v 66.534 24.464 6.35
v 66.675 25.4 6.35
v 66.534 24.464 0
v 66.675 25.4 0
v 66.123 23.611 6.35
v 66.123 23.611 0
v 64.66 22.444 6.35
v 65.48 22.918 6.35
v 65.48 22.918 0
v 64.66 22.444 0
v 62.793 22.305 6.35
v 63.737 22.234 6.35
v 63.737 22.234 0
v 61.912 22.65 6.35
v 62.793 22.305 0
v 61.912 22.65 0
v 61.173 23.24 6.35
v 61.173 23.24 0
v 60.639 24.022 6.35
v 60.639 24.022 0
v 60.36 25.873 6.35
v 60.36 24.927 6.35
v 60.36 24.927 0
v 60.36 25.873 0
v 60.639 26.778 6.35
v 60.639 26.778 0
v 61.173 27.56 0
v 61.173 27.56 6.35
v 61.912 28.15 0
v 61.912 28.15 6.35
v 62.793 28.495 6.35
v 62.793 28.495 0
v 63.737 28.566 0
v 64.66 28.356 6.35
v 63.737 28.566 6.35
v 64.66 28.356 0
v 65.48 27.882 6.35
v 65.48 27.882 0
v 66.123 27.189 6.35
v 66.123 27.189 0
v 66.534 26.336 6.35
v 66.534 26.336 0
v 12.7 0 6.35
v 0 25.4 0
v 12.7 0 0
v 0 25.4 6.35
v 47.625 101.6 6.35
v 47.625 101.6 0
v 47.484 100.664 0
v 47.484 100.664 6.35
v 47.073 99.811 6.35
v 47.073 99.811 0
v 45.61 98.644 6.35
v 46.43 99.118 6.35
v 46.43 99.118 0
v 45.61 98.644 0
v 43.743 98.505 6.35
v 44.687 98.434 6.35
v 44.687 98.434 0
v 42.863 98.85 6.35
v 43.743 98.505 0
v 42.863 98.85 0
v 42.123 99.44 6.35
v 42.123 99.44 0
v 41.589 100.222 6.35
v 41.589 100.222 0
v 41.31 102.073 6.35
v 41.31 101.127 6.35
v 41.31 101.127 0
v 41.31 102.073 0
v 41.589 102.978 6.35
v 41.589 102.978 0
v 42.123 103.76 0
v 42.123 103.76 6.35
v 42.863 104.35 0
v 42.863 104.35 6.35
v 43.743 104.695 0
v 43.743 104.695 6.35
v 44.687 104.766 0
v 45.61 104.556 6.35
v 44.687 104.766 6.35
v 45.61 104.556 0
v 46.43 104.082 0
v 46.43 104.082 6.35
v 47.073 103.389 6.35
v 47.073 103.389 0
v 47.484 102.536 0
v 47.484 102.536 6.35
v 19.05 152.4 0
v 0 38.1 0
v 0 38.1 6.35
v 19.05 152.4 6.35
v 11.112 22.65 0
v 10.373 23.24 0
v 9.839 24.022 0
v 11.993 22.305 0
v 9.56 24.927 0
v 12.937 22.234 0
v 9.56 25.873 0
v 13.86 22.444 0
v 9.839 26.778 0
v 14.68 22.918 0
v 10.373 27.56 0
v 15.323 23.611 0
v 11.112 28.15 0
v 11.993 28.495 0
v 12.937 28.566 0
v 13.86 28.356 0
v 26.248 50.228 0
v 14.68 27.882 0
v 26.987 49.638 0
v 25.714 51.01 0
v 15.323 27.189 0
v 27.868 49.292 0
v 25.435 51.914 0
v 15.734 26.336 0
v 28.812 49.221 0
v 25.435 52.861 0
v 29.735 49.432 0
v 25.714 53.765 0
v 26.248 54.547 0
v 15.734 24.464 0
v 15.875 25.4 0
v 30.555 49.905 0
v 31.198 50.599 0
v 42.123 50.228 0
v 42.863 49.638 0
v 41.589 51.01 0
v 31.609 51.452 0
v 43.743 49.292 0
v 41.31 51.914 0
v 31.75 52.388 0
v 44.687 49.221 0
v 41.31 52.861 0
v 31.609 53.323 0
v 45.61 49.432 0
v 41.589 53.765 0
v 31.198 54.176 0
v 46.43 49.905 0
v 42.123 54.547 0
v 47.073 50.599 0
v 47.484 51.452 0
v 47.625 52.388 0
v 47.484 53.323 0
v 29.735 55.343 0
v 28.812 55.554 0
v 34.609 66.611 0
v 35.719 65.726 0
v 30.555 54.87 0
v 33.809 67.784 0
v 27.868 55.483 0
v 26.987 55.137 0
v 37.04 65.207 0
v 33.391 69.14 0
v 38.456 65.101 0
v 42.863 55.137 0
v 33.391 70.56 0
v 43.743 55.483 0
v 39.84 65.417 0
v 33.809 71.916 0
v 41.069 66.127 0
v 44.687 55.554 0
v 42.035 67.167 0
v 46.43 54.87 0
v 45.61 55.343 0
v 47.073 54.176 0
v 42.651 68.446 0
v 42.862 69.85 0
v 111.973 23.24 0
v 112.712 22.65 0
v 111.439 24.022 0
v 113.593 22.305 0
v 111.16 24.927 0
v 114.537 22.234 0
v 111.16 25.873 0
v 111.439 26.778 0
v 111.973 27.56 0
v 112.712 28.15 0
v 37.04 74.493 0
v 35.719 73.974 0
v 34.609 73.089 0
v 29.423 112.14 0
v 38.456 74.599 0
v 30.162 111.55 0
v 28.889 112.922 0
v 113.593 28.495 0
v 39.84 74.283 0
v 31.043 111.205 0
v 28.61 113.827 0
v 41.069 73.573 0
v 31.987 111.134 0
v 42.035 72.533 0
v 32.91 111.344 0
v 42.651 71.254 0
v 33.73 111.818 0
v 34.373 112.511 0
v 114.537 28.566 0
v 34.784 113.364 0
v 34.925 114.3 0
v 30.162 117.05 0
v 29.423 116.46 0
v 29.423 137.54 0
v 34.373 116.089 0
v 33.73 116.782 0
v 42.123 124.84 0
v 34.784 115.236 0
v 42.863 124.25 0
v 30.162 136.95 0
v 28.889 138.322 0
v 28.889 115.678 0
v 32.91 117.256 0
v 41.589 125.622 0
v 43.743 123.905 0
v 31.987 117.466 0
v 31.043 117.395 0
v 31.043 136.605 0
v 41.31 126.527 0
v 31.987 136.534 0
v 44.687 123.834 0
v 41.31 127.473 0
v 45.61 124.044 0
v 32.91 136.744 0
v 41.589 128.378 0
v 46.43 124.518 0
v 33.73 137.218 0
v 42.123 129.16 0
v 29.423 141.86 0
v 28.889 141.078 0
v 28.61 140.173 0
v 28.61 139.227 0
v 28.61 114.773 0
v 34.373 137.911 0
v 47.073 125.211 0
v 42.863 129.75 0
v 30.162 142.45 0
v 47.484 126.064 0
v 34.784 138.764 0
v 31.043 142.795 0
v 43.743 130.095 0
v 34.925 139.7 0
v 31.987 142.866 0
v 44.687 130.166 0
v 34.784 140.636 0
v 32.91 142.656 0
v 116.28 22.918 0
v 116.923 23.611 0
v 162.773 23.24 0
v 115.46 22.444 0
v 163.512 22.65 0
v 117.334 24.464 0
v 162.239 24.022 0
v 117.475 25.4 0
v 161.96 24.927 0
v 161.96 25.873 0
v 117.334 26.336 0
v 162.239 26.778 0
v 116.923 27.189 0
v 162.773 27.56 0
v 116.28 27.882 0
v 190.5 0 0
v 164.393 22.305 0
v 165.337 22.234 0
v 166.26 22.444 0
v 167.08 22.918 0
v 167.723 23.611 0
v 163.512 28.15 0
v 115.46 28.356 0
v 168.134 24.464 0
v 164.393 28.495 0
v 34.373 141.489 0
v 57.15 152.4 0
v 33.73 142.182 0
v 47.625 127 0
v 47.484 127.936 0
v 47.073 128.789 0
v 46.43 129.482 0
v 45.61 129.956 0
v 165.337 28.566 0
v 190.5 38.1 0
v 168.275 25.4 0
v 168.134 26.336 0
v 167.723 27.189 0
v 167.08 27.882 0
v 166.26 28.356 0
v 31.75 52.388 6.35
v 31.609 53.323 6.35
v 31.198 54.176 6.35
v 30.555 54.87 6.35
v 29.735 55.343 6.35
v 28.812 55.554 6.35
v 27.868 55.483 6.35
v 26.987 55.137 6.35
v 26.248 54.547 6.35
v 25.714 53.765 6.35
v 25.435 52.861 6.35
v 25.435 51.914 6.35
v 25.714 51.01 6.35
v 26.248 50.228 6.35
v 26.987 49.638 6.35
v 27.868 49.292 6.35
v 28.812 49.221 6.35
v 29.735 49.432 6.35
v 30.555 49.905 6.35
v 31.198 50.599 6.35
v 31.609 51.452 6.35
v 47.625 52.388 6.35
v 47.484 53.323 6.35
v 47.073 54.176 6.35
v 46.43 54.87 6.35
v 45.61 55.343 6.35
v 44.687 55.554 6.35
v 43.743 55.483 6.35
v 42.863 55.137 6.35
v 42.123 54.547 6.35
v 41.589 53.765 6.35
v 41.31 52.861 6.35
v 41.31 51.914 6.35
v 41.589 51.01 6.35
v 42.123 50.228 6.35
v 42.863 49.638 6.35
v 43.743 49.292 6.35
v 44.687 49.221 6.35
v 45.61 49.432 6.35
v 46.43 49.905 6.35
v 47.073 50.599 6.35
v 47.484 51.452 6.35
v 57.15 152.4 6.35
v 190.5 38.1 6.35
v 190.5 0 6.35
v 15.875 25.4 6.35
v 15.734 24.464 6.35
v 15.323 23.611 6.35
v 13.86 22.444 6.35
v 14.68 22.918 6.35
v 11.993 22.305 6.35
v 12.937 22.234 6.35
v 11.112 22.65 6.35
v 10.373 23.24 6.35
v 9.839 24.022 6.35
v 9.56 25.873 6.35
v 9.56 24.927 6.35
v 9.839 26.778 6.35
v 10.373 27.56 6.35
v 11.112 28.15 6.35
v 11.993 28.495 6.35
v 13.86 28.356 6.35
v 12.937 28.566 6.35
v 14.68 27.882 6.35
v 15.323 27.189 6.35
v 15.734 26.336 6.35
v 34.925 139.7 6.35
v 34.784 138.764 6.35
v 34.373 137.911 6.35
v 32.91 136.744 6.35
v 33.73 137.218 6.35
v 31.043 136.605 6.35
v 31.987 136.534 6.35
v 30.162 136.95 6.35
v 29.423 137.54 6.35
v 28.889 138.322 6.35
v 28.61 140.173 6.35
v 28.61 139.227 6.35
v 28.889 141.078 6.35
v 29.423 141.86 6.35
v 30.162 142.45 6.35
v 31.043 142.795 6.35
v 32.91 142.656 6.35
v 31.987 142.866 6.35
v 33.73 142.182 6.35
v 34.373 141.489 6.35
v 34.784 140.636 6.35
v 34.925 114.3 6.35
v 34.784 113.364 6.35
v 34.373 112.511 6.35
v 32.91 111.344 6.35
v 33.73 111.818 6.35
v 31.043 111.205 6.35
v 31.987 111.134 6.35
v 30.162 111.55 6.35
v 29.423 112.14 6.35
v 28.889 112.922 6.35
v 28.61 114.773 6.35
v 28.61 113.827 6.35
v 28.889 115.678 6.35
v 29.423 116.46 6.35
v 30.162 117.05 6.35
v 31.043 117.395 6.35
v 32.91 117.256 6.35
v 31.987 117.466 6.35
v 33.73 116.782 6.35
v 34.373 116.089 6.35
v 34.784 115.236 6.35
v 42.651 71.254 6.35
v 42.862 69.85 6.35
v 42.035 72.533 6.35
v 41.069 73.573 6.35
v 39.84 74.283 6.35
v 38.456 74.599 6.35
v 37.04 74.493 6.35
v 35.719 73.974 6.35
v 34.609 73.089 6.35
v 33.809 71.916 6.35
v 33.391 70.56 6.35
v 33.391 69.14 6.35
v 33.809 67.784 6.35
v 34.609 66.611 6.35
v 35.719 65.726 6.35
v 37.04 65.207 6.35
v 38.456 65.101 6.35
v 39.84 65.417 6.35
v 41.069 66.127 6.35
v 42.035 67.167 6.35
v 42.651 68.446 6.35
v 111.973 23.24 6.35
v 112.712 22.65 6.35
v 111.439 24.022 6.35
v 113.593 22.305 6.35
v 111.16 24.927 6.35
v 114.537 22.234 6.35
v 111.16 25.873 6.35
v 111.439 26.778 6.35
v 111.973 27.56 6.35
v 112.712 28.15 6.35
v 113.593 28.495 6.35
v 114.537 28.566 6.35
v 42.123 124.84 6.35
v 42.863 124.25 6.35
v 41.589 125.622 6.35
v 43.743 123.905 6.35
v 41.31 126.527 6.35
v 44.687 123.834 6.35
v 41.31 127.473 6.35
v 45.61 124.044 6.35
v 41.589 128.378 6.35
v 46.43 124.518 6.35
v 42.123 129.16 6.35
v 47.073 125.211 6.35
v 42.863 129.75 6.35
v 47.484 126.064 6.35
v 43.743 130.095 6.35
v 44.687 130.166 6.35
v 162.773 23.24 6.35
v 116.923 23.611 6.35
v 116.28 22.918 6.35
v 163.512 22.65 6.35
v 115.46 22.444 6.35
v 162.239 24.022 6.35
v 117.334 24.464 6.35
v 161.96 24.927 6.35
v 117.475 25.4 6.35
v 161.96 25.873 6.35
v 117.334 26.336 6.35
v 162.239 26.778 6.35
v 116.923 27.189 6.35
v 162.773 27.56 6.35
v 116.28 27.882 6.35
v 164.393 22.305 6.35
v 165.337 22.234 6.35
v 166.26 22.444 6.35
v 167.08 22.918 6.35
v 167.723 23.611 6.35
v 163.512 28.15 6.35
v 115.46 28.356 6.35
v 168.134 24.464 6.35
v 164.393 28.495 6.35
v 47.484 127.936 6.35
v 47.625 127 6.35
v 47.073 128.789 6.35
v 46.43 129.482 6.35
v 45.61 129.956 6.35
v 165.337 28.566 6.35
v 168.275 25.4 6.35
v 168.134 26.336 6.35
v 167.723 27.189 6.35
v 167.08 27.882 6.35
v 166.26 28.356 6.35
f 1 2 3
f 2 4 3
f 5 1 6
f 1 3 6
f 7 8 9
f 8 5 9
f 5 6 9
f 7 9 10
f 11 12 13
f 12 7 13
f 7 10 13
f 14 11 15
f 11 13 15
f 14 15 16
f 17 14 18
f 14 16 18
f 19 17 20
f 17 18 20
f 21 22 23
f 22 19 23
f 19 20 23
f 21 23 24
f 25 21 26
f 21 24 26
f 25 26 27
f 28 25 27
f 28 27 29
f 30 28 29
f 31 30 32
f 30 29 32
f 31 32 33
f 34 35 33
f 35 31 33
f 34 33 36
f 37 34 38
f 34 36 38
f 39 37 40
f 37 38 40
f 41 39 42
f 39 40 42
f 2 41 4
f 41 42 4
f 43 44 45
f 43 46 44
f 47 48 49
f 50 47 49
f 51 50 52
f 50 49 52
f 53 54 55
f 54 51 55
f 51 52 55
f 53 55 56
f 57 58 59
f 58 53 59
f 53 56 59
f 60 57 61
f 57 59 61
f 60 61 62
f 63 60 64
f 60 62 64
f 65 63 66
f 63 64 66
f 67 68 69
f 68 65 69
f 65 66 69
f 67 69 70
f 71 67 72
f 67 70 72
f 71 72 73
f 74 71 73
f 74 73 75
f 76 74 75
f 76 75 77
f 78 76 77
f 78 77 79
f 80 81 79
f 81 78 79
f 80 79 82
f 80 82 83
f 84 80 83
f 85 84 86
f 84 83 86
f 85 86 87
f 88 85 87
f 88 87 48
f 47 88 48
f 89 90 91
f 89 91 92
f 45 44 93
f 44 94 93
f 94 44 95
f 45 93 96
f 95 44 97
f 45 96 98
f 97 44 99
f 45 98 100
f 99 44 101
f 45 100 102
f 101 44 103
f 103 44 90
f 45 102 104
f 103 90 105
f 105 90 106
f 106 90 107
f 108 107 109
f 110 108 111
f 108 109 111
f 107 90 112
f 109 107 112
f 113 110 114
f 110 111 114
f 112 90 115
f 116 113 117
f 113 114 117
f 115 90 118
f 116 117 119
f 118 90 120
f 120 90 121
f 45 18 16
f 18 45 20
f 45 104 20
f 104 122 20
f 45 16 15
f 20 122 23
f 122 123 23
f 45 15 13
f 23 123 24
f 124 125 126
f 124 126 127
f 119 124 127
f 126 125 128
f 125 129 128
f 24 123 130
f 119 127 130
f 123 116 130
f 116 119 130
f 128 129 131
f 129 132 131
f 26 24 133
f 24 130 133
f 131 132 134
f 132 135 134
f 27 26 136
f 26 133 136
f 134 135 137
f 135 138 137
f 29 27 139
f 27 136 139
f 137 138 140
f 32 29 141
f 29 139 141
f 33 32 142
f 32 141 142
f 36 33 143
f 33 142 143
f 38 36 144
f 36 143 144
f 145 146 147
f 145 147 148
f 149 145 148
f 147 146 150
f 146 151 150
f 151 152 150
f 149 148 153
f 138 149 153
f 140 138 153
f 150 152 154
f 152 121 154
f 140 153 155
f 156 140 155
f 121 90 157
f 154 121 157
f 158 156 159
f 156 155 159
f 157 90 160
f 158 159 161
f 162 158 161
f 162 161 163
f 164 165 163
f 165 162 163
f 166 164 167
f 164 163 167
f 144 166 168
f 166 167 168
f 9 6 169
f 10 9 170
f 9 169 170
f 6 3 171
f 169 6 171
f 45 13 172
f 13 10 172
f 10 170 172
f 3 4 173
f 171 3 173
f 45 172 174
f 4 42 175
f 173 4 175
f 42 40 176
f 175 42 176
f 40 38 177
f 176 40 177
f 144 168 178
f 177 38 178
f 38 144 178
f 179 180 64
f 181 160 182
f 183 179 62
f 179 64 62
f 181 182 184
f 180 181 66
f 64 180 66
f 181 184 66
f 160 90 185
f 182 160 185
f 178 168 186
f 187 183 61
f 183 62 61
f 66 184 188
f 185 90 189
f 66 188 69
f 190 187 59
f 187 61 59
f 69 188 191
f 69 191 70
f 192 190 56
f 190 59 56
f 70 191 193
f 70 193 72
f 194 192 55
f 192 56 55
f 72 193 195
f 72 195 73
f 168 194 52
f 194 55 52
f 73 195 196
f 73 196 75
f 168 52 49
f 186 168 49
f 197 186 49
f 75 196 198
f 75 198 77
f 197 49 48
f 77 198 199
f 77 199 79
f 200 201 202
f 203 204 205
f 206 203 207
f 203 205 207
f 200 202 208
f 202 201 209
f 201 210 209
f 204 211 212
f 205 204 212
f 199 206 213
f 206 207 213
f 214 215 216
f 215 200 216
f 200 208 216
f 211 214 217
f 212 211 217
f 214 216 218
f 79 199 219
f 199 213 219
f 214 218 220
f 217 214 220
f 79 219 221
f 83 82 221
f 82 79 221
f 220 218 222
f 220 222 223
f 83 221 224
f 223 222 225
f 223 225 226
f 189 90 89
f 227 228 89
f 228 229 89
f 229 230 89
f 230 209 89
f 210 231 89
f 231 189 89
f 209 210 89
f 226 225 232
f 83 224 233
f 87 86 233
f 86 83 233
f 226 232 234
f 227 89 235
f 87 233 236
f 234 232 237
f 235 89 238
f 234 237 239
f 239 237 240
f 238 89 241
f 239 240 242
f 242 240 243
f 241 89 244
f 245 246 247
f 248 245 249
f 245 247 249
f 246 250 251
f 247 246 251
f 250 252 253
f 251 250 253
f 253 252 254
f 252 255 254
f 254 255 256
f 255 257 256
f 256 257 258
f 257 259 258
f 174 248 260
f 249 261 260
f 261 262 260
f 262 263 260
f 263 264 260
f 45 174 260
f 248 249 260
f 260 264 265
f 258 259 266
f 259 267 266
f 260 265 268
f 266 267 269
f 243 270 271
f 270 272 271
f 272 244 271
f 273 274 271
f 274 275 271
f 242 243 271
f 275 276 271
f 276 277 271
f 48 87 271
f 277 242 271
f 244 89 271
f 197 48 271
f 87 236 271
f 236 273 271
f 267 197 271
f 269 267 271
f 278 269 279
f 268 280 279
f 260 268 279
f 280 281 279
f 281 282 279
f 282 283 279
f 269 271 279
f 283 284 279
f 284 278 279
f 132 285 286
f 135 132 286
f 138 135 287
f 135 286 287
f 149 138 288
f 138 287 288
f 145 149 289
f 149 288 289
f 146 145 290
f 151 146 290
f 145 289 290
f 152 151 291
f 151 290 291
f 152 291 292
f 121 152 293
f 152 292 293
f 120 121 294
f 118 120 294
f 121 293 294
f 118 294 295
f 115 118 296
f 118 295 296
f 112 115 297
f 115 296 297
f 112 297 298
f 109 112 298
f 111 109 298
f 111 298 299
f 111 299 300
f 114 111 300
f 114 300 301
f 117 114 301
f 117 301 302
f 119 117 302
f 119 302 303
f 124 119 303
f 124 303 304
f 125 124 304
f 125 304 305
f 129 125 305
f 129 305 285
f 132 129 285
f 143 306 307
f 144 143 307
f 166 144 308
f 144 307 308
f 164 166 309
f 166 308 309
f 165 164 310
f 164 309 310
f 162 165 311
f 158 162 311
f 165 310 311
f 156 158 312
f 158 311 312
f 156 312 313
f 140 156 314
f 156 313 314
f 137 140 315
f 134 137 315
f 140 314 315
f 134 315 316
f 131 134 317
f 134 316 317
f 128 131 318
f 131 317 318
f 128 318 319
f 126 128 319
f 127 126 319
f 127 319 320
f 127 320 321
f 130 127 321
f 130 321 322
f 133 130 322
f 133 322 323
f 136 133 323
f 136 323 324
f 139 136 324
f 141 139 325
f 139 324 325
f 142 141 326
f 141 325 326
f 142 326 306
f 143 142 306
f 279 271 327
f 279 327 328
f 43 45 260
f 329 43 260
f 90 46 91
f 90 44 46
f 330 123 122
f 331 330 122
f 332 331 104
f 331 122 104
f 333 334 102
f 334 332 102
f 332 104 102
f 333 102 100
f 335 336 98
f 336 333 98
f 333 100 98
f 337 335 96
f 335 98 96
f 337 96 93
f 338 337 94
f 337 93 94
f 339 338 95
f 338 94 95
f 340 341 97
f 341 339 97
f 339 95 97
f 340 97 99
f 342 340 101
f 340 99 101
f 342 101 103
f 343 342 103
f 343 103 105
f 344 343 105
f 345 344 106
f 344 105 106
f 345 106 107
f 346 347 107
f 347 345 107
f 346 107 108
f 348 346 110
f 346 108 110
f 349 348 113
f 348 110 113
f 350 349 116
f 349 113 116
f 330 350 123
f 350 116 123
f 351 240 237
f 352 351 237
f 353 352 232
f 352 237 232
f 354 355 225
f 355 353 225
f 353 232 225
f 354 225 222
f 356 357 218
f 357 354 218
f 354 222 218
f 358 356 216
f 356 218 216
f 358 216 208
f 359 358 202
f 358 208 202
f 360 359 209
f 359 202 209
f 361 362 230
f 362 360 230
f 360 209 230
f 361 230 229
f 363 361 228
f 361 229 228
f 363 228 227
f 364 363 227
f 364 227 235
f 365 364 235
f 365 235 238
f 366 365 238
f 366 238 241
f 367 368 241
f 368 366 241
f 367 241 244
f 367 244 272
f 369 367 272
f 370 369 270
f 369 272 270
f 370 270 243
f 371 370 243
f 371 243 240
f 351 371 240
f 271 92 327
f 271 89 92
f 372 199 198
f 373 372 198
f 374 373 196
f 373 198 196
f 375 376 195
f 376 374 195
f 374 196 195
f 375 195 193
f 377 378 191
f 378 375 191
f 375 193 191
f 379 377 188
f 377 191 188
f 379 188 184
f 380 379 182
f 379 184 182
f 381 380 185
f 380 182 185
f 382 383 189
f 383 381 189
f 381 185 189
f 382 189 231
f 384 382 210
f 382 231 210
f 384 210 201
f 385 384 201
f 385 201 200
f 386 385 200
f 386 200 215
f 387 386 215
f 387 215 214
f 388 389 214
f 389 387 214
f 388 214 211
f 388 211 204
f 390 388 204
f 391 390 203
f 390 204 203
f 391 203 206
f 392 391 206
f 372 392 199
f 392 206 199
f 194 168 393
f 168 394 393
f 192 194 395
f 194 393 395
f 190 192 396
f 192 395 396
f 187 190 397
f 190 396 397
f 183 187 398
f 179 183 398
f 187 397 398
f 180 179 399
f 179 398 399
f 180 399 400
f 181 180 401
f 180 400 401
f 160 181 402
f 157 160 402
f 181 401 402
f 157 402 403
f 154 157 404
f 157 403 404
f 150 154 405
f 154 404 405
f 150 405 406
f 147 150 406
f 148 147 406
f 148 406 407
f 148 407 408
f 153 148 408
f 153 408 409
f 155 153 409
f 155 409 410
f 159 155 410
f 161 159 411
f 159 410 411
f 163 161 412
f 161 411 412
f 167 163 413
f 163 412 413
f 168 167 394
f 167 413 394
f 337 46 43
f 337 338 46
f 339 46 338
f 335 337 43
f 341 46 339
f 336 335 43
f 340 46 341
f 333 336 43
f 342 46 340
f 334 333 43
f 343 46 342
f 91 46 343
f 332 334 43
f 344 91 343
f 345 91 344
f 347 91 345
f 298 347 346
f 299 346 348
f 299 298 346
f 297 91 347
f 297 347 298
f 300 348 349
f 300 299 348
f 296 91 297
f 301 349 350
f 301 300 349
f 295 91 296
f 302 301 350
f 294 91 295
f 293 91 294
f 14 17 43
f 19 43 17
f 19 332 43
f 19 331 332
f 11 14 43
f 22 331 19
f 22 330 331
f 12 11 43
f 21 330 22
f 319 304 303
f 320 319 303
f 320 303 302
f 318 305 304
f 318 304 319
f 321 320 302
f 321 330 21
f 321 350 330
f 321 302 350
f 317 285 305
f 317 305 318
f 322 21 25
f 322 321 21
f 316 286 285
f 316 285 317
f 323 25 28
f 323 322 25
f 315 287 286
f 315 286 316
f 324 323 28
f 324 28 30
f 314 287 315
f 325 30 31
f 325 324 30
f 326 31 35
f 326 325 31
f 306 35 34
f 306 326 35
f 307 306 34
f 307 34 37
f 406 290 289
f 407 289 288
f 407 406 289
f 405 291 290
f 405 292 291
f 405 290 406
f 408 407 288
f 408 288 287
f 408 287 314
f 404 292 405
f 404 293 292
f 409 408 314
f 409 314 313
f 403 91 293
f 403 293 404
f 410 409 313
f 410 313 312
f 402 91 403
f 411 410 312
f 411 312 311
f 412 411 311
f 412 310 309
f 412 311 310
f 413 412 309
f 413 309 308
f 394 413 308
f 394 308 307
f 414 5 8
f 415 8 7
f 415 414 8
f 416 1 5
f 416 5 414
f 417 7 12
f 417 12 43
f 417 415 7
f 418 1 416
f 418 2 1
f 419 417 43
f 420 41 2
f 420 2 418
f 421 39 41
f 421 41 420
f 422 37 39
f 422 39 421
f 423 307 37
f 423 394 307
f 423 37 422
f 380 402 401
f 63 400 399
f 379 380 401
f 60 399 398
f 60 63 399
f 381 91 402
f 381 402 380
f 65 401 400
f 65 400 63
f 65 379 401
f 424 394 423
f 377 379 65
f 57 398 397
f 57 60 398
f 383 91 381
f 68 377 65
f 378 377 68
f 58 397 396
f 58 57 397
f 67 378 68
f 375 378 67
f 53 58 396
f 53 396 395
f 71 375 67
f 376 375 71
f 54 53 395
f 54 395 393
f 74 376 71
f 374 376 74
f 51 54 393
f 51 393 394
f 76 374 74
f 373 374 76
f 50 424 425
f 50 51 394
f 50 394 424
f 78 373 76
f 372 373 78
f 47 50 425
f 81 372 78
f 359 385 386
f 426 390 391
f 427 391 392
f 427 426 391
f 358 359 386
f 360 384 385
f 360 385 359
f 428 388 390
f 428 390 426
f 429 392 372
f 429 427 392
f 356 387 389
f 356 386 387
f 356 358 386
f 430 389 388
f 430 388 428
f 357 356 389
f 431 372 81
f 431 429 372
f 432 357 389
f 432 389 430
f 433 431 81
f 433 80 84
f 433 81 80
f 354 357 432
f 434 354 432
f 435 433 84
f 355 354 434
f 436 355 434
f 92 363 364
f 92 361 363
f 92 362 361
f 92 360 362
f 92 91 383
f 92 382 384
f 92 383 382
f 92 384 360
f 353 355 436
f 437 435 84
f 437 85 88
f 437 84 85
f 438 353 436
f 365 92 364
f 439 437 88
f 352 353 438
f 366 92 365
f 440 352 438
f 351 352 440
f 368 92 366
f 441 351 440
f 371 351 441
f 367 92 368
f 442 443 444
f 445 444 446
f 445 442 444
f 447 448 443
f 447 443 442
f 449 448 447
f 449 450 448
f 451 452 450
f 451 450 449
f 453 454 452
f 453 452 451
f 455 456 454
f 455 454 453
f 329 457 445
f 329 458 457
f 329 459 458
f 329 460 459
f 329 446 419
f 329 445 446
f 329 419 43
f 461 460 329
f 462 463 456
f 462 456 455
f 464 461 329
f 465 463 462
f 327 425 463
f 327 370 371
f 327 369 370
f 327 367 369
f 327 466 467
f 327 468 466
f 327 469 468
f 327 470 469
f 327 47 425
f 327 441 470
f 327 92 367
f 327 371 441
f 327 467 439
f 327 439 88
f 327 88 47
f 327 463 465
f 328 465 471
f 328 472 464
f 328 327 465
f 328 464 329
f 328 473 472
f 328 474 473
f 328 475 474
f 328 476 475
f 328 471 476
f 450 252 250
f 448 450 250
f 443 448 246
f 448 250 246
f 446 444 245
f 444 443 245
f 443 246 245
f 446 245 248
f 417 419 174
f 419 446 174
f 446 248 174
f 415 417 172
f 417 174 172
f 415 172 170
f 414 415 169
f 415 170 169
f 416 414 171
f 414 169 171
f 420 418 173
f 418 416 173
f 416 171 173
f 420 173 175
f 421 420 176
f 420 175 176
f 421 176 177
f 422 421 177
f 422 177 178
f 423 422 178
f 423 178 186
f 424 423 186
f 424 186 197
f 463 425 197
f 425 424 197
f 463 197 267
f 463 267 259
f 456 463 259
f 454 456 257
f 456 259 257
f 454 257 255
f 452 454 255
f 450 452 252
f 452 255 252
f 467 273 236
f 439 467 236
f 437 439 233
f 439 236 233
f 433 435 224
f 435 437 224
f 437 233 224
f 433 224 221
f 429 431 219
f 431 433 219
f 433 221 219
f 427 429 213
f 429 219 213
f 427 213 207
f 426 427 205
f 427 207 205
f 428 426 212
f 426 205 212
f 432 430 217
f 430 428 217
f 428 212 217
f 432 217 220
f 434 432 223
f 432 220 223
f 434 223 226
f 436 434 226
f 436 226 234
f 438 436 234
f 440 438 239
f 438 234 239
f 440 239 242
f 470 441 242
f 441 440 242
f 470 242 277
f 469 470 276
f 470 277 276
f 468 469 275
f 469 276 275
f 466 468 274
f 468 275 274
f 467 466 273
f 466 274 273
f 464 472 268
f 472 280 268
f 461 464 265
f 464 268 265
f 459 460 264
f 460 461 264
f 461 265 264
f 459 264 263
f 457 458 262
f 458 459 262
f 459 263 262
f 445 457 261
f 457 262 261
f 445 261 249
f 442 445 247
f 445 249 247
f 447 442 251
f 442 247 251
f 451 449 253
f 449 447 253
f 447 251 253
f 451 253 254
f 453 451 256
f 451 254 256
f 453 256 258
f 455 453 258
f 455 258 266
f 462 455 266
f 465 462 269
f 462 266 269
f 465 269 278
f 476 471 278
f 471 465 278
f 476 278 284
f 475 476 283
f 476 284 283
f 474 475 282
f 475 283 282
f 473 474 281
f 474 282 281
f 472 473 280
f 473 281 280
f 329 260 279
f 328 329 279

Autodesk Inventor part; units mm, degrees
ref_plane "YZ Plane" through (0, 0, 0) normal (1, 0, 0) x (0, 1, 0)
ref_plane "XZ Plane" through (0, 0, 0) normal (0, 1, 0) x (-1, 0, 0)
ref_plane "XY Plane" through (0, 0, 0) normal (0, 0, 1) x (1, 0, 0)
sketch "Sketch1" plane through (0, 0, 0) normal (0, 0, 1) x (1, 0, 0)
  line L0 (0, 0) -> (190.5, 0) construction
  line L1 (190.5, 0) -> (190.5, 152.4) construction
  line L2 (190.5, 152.4) -> (0, 152.4) construction
  line L3 (0, 152.4) -> (0, 0) construction
  line L4 (0, 0) -> (190.5, 0)
  line L5 (0, 0) -> (0, 38.1)
  line L6 (0, 0) -> (38.1, 0) construction
  line L7 (190.5, 0) -> (190.5, 38.1)
  line L8 (190.5, 0) -> (228.6, 0) construction
  line L9 (190.5, 152.4) -> (57.15, 152.4) construction
  line L10 (190.5, 152.4) -> (323.85, 152.4) construction
  line L11 (57.15, 152.4) -> (19.05, 152.4) construction
  line L12 (0, 38.1) -> (19.05, 152.4)
  line L13 (19.05, 152.4) -> (57.15, 152.4)
  line L14 (57.15, 152.4) -> (190.5, 38.1)
  circle A0 centre (12.7, 25.4) radius 3.175
  circle A1 centre (63.5, 25.4) radius 3.175
  circle A2 centre (31.75, 139.7) radius 3.175
  circle A3 centre (44.45, 127) radius 3.175
  circle A4 centre (31.75, 114.3) radius 3.175
  circle A5 centre (44.45, 101.6) radius 3.175
  circle A6 centre (114.3, 25.4) radius 3.175
  circle A7 centre (165.1, 25.4) radius 3.175
  dimension "d0" = 190.5
  dimension "d1" = 152.4
  dimension "d2" = 12.7
  dimension "d3" = 50.8
  dimension "d8" = 25.4
  dimension "d9" = 25.4
  dimension "d10" = 38.1
  dimension "d11" = 90
  dimension "d12" = 38.1
  dimension "d13" = 90
  dimension "d14" = 133.35
  dimension "d15" = 180
  dimension "d16" = 38.1
  dimension "d17" = 12.7
  dimension "d18" = 12.7
  dimension "d19" = 12.7
  dimension "d20" = 12.7
  dimension "d21" = 12.7
  dimension "d22" = 25.4
  dimension "d23" = 38.1
  dimension "d24" = 50.8
  dimension "d25" = 6.35
  dimension "d26" = 6.35
  dimension "d29" = 6.35
  dimension "d30" = 6.35
  dimension "d31" = 6.35
  dimension "d32" = 6.35
  dimension "d35" = 50.8
  dimension "d36" = 50.8
  dimension "d38" = 6.35
  dimension "d39" = 6.35
  dimension "d46" = 25.4
  dimension "d47" = 25.4
extrude "Extrusion4" add sketch "Sketch1" along normal blind 6.35
sketch "Sketch3" plane through (0, 0, 6.35) normal (0, 0, 1) x (1, 0, 0)
  line L0 (0, 0) -> (0, 25.4)
  line L1 (0, 38.1) -> (0, 0) projected
  line L2 (0, 0) -> (12.7, 0)
  line L3 (0, 0) -> (190.5, 0) projected
  line L4 (0, 25.4) -> (12.7, 0)
  dimension "d50" = 25.4
  dimension "d51" = 12.7
extrude "Extrusion5" cut sketch "Sketch3" against normal blind 6.35
sketch "Sketch4" plane through (0, 0, 6.35) normal (0, 0, 1) x (1, 0, 0)
  line L0 (0, 38.1) -> (0, 25.4) projected
  line L1 (12.7, 0) -> (190.5, 0) projected
  circle A0 centre (28.575, 52.3875) radius 3.175
  circle A1 centre (44.45, 52.3875) radius 3.175
  circle A2 centre (38.1, 69.85) radius 4.7625
  point P0 (0, 0)
  dimension "d54" = 28.575
  dimension "d55" = 44.45
  dimension "d56" = 52.3875
  dimension "d57" = 52.3875
  dimension "d58" = 69.85
  dimension "d59" = 38.1
  dimension "d60" = 6.35
  dimension "d61" = 6.35
  dimension "d62" = 9.525
extrude "Extrusion6" cut sketch "Sketch4" against normal blind 6.35
properties part number "rail mounting bracket"
